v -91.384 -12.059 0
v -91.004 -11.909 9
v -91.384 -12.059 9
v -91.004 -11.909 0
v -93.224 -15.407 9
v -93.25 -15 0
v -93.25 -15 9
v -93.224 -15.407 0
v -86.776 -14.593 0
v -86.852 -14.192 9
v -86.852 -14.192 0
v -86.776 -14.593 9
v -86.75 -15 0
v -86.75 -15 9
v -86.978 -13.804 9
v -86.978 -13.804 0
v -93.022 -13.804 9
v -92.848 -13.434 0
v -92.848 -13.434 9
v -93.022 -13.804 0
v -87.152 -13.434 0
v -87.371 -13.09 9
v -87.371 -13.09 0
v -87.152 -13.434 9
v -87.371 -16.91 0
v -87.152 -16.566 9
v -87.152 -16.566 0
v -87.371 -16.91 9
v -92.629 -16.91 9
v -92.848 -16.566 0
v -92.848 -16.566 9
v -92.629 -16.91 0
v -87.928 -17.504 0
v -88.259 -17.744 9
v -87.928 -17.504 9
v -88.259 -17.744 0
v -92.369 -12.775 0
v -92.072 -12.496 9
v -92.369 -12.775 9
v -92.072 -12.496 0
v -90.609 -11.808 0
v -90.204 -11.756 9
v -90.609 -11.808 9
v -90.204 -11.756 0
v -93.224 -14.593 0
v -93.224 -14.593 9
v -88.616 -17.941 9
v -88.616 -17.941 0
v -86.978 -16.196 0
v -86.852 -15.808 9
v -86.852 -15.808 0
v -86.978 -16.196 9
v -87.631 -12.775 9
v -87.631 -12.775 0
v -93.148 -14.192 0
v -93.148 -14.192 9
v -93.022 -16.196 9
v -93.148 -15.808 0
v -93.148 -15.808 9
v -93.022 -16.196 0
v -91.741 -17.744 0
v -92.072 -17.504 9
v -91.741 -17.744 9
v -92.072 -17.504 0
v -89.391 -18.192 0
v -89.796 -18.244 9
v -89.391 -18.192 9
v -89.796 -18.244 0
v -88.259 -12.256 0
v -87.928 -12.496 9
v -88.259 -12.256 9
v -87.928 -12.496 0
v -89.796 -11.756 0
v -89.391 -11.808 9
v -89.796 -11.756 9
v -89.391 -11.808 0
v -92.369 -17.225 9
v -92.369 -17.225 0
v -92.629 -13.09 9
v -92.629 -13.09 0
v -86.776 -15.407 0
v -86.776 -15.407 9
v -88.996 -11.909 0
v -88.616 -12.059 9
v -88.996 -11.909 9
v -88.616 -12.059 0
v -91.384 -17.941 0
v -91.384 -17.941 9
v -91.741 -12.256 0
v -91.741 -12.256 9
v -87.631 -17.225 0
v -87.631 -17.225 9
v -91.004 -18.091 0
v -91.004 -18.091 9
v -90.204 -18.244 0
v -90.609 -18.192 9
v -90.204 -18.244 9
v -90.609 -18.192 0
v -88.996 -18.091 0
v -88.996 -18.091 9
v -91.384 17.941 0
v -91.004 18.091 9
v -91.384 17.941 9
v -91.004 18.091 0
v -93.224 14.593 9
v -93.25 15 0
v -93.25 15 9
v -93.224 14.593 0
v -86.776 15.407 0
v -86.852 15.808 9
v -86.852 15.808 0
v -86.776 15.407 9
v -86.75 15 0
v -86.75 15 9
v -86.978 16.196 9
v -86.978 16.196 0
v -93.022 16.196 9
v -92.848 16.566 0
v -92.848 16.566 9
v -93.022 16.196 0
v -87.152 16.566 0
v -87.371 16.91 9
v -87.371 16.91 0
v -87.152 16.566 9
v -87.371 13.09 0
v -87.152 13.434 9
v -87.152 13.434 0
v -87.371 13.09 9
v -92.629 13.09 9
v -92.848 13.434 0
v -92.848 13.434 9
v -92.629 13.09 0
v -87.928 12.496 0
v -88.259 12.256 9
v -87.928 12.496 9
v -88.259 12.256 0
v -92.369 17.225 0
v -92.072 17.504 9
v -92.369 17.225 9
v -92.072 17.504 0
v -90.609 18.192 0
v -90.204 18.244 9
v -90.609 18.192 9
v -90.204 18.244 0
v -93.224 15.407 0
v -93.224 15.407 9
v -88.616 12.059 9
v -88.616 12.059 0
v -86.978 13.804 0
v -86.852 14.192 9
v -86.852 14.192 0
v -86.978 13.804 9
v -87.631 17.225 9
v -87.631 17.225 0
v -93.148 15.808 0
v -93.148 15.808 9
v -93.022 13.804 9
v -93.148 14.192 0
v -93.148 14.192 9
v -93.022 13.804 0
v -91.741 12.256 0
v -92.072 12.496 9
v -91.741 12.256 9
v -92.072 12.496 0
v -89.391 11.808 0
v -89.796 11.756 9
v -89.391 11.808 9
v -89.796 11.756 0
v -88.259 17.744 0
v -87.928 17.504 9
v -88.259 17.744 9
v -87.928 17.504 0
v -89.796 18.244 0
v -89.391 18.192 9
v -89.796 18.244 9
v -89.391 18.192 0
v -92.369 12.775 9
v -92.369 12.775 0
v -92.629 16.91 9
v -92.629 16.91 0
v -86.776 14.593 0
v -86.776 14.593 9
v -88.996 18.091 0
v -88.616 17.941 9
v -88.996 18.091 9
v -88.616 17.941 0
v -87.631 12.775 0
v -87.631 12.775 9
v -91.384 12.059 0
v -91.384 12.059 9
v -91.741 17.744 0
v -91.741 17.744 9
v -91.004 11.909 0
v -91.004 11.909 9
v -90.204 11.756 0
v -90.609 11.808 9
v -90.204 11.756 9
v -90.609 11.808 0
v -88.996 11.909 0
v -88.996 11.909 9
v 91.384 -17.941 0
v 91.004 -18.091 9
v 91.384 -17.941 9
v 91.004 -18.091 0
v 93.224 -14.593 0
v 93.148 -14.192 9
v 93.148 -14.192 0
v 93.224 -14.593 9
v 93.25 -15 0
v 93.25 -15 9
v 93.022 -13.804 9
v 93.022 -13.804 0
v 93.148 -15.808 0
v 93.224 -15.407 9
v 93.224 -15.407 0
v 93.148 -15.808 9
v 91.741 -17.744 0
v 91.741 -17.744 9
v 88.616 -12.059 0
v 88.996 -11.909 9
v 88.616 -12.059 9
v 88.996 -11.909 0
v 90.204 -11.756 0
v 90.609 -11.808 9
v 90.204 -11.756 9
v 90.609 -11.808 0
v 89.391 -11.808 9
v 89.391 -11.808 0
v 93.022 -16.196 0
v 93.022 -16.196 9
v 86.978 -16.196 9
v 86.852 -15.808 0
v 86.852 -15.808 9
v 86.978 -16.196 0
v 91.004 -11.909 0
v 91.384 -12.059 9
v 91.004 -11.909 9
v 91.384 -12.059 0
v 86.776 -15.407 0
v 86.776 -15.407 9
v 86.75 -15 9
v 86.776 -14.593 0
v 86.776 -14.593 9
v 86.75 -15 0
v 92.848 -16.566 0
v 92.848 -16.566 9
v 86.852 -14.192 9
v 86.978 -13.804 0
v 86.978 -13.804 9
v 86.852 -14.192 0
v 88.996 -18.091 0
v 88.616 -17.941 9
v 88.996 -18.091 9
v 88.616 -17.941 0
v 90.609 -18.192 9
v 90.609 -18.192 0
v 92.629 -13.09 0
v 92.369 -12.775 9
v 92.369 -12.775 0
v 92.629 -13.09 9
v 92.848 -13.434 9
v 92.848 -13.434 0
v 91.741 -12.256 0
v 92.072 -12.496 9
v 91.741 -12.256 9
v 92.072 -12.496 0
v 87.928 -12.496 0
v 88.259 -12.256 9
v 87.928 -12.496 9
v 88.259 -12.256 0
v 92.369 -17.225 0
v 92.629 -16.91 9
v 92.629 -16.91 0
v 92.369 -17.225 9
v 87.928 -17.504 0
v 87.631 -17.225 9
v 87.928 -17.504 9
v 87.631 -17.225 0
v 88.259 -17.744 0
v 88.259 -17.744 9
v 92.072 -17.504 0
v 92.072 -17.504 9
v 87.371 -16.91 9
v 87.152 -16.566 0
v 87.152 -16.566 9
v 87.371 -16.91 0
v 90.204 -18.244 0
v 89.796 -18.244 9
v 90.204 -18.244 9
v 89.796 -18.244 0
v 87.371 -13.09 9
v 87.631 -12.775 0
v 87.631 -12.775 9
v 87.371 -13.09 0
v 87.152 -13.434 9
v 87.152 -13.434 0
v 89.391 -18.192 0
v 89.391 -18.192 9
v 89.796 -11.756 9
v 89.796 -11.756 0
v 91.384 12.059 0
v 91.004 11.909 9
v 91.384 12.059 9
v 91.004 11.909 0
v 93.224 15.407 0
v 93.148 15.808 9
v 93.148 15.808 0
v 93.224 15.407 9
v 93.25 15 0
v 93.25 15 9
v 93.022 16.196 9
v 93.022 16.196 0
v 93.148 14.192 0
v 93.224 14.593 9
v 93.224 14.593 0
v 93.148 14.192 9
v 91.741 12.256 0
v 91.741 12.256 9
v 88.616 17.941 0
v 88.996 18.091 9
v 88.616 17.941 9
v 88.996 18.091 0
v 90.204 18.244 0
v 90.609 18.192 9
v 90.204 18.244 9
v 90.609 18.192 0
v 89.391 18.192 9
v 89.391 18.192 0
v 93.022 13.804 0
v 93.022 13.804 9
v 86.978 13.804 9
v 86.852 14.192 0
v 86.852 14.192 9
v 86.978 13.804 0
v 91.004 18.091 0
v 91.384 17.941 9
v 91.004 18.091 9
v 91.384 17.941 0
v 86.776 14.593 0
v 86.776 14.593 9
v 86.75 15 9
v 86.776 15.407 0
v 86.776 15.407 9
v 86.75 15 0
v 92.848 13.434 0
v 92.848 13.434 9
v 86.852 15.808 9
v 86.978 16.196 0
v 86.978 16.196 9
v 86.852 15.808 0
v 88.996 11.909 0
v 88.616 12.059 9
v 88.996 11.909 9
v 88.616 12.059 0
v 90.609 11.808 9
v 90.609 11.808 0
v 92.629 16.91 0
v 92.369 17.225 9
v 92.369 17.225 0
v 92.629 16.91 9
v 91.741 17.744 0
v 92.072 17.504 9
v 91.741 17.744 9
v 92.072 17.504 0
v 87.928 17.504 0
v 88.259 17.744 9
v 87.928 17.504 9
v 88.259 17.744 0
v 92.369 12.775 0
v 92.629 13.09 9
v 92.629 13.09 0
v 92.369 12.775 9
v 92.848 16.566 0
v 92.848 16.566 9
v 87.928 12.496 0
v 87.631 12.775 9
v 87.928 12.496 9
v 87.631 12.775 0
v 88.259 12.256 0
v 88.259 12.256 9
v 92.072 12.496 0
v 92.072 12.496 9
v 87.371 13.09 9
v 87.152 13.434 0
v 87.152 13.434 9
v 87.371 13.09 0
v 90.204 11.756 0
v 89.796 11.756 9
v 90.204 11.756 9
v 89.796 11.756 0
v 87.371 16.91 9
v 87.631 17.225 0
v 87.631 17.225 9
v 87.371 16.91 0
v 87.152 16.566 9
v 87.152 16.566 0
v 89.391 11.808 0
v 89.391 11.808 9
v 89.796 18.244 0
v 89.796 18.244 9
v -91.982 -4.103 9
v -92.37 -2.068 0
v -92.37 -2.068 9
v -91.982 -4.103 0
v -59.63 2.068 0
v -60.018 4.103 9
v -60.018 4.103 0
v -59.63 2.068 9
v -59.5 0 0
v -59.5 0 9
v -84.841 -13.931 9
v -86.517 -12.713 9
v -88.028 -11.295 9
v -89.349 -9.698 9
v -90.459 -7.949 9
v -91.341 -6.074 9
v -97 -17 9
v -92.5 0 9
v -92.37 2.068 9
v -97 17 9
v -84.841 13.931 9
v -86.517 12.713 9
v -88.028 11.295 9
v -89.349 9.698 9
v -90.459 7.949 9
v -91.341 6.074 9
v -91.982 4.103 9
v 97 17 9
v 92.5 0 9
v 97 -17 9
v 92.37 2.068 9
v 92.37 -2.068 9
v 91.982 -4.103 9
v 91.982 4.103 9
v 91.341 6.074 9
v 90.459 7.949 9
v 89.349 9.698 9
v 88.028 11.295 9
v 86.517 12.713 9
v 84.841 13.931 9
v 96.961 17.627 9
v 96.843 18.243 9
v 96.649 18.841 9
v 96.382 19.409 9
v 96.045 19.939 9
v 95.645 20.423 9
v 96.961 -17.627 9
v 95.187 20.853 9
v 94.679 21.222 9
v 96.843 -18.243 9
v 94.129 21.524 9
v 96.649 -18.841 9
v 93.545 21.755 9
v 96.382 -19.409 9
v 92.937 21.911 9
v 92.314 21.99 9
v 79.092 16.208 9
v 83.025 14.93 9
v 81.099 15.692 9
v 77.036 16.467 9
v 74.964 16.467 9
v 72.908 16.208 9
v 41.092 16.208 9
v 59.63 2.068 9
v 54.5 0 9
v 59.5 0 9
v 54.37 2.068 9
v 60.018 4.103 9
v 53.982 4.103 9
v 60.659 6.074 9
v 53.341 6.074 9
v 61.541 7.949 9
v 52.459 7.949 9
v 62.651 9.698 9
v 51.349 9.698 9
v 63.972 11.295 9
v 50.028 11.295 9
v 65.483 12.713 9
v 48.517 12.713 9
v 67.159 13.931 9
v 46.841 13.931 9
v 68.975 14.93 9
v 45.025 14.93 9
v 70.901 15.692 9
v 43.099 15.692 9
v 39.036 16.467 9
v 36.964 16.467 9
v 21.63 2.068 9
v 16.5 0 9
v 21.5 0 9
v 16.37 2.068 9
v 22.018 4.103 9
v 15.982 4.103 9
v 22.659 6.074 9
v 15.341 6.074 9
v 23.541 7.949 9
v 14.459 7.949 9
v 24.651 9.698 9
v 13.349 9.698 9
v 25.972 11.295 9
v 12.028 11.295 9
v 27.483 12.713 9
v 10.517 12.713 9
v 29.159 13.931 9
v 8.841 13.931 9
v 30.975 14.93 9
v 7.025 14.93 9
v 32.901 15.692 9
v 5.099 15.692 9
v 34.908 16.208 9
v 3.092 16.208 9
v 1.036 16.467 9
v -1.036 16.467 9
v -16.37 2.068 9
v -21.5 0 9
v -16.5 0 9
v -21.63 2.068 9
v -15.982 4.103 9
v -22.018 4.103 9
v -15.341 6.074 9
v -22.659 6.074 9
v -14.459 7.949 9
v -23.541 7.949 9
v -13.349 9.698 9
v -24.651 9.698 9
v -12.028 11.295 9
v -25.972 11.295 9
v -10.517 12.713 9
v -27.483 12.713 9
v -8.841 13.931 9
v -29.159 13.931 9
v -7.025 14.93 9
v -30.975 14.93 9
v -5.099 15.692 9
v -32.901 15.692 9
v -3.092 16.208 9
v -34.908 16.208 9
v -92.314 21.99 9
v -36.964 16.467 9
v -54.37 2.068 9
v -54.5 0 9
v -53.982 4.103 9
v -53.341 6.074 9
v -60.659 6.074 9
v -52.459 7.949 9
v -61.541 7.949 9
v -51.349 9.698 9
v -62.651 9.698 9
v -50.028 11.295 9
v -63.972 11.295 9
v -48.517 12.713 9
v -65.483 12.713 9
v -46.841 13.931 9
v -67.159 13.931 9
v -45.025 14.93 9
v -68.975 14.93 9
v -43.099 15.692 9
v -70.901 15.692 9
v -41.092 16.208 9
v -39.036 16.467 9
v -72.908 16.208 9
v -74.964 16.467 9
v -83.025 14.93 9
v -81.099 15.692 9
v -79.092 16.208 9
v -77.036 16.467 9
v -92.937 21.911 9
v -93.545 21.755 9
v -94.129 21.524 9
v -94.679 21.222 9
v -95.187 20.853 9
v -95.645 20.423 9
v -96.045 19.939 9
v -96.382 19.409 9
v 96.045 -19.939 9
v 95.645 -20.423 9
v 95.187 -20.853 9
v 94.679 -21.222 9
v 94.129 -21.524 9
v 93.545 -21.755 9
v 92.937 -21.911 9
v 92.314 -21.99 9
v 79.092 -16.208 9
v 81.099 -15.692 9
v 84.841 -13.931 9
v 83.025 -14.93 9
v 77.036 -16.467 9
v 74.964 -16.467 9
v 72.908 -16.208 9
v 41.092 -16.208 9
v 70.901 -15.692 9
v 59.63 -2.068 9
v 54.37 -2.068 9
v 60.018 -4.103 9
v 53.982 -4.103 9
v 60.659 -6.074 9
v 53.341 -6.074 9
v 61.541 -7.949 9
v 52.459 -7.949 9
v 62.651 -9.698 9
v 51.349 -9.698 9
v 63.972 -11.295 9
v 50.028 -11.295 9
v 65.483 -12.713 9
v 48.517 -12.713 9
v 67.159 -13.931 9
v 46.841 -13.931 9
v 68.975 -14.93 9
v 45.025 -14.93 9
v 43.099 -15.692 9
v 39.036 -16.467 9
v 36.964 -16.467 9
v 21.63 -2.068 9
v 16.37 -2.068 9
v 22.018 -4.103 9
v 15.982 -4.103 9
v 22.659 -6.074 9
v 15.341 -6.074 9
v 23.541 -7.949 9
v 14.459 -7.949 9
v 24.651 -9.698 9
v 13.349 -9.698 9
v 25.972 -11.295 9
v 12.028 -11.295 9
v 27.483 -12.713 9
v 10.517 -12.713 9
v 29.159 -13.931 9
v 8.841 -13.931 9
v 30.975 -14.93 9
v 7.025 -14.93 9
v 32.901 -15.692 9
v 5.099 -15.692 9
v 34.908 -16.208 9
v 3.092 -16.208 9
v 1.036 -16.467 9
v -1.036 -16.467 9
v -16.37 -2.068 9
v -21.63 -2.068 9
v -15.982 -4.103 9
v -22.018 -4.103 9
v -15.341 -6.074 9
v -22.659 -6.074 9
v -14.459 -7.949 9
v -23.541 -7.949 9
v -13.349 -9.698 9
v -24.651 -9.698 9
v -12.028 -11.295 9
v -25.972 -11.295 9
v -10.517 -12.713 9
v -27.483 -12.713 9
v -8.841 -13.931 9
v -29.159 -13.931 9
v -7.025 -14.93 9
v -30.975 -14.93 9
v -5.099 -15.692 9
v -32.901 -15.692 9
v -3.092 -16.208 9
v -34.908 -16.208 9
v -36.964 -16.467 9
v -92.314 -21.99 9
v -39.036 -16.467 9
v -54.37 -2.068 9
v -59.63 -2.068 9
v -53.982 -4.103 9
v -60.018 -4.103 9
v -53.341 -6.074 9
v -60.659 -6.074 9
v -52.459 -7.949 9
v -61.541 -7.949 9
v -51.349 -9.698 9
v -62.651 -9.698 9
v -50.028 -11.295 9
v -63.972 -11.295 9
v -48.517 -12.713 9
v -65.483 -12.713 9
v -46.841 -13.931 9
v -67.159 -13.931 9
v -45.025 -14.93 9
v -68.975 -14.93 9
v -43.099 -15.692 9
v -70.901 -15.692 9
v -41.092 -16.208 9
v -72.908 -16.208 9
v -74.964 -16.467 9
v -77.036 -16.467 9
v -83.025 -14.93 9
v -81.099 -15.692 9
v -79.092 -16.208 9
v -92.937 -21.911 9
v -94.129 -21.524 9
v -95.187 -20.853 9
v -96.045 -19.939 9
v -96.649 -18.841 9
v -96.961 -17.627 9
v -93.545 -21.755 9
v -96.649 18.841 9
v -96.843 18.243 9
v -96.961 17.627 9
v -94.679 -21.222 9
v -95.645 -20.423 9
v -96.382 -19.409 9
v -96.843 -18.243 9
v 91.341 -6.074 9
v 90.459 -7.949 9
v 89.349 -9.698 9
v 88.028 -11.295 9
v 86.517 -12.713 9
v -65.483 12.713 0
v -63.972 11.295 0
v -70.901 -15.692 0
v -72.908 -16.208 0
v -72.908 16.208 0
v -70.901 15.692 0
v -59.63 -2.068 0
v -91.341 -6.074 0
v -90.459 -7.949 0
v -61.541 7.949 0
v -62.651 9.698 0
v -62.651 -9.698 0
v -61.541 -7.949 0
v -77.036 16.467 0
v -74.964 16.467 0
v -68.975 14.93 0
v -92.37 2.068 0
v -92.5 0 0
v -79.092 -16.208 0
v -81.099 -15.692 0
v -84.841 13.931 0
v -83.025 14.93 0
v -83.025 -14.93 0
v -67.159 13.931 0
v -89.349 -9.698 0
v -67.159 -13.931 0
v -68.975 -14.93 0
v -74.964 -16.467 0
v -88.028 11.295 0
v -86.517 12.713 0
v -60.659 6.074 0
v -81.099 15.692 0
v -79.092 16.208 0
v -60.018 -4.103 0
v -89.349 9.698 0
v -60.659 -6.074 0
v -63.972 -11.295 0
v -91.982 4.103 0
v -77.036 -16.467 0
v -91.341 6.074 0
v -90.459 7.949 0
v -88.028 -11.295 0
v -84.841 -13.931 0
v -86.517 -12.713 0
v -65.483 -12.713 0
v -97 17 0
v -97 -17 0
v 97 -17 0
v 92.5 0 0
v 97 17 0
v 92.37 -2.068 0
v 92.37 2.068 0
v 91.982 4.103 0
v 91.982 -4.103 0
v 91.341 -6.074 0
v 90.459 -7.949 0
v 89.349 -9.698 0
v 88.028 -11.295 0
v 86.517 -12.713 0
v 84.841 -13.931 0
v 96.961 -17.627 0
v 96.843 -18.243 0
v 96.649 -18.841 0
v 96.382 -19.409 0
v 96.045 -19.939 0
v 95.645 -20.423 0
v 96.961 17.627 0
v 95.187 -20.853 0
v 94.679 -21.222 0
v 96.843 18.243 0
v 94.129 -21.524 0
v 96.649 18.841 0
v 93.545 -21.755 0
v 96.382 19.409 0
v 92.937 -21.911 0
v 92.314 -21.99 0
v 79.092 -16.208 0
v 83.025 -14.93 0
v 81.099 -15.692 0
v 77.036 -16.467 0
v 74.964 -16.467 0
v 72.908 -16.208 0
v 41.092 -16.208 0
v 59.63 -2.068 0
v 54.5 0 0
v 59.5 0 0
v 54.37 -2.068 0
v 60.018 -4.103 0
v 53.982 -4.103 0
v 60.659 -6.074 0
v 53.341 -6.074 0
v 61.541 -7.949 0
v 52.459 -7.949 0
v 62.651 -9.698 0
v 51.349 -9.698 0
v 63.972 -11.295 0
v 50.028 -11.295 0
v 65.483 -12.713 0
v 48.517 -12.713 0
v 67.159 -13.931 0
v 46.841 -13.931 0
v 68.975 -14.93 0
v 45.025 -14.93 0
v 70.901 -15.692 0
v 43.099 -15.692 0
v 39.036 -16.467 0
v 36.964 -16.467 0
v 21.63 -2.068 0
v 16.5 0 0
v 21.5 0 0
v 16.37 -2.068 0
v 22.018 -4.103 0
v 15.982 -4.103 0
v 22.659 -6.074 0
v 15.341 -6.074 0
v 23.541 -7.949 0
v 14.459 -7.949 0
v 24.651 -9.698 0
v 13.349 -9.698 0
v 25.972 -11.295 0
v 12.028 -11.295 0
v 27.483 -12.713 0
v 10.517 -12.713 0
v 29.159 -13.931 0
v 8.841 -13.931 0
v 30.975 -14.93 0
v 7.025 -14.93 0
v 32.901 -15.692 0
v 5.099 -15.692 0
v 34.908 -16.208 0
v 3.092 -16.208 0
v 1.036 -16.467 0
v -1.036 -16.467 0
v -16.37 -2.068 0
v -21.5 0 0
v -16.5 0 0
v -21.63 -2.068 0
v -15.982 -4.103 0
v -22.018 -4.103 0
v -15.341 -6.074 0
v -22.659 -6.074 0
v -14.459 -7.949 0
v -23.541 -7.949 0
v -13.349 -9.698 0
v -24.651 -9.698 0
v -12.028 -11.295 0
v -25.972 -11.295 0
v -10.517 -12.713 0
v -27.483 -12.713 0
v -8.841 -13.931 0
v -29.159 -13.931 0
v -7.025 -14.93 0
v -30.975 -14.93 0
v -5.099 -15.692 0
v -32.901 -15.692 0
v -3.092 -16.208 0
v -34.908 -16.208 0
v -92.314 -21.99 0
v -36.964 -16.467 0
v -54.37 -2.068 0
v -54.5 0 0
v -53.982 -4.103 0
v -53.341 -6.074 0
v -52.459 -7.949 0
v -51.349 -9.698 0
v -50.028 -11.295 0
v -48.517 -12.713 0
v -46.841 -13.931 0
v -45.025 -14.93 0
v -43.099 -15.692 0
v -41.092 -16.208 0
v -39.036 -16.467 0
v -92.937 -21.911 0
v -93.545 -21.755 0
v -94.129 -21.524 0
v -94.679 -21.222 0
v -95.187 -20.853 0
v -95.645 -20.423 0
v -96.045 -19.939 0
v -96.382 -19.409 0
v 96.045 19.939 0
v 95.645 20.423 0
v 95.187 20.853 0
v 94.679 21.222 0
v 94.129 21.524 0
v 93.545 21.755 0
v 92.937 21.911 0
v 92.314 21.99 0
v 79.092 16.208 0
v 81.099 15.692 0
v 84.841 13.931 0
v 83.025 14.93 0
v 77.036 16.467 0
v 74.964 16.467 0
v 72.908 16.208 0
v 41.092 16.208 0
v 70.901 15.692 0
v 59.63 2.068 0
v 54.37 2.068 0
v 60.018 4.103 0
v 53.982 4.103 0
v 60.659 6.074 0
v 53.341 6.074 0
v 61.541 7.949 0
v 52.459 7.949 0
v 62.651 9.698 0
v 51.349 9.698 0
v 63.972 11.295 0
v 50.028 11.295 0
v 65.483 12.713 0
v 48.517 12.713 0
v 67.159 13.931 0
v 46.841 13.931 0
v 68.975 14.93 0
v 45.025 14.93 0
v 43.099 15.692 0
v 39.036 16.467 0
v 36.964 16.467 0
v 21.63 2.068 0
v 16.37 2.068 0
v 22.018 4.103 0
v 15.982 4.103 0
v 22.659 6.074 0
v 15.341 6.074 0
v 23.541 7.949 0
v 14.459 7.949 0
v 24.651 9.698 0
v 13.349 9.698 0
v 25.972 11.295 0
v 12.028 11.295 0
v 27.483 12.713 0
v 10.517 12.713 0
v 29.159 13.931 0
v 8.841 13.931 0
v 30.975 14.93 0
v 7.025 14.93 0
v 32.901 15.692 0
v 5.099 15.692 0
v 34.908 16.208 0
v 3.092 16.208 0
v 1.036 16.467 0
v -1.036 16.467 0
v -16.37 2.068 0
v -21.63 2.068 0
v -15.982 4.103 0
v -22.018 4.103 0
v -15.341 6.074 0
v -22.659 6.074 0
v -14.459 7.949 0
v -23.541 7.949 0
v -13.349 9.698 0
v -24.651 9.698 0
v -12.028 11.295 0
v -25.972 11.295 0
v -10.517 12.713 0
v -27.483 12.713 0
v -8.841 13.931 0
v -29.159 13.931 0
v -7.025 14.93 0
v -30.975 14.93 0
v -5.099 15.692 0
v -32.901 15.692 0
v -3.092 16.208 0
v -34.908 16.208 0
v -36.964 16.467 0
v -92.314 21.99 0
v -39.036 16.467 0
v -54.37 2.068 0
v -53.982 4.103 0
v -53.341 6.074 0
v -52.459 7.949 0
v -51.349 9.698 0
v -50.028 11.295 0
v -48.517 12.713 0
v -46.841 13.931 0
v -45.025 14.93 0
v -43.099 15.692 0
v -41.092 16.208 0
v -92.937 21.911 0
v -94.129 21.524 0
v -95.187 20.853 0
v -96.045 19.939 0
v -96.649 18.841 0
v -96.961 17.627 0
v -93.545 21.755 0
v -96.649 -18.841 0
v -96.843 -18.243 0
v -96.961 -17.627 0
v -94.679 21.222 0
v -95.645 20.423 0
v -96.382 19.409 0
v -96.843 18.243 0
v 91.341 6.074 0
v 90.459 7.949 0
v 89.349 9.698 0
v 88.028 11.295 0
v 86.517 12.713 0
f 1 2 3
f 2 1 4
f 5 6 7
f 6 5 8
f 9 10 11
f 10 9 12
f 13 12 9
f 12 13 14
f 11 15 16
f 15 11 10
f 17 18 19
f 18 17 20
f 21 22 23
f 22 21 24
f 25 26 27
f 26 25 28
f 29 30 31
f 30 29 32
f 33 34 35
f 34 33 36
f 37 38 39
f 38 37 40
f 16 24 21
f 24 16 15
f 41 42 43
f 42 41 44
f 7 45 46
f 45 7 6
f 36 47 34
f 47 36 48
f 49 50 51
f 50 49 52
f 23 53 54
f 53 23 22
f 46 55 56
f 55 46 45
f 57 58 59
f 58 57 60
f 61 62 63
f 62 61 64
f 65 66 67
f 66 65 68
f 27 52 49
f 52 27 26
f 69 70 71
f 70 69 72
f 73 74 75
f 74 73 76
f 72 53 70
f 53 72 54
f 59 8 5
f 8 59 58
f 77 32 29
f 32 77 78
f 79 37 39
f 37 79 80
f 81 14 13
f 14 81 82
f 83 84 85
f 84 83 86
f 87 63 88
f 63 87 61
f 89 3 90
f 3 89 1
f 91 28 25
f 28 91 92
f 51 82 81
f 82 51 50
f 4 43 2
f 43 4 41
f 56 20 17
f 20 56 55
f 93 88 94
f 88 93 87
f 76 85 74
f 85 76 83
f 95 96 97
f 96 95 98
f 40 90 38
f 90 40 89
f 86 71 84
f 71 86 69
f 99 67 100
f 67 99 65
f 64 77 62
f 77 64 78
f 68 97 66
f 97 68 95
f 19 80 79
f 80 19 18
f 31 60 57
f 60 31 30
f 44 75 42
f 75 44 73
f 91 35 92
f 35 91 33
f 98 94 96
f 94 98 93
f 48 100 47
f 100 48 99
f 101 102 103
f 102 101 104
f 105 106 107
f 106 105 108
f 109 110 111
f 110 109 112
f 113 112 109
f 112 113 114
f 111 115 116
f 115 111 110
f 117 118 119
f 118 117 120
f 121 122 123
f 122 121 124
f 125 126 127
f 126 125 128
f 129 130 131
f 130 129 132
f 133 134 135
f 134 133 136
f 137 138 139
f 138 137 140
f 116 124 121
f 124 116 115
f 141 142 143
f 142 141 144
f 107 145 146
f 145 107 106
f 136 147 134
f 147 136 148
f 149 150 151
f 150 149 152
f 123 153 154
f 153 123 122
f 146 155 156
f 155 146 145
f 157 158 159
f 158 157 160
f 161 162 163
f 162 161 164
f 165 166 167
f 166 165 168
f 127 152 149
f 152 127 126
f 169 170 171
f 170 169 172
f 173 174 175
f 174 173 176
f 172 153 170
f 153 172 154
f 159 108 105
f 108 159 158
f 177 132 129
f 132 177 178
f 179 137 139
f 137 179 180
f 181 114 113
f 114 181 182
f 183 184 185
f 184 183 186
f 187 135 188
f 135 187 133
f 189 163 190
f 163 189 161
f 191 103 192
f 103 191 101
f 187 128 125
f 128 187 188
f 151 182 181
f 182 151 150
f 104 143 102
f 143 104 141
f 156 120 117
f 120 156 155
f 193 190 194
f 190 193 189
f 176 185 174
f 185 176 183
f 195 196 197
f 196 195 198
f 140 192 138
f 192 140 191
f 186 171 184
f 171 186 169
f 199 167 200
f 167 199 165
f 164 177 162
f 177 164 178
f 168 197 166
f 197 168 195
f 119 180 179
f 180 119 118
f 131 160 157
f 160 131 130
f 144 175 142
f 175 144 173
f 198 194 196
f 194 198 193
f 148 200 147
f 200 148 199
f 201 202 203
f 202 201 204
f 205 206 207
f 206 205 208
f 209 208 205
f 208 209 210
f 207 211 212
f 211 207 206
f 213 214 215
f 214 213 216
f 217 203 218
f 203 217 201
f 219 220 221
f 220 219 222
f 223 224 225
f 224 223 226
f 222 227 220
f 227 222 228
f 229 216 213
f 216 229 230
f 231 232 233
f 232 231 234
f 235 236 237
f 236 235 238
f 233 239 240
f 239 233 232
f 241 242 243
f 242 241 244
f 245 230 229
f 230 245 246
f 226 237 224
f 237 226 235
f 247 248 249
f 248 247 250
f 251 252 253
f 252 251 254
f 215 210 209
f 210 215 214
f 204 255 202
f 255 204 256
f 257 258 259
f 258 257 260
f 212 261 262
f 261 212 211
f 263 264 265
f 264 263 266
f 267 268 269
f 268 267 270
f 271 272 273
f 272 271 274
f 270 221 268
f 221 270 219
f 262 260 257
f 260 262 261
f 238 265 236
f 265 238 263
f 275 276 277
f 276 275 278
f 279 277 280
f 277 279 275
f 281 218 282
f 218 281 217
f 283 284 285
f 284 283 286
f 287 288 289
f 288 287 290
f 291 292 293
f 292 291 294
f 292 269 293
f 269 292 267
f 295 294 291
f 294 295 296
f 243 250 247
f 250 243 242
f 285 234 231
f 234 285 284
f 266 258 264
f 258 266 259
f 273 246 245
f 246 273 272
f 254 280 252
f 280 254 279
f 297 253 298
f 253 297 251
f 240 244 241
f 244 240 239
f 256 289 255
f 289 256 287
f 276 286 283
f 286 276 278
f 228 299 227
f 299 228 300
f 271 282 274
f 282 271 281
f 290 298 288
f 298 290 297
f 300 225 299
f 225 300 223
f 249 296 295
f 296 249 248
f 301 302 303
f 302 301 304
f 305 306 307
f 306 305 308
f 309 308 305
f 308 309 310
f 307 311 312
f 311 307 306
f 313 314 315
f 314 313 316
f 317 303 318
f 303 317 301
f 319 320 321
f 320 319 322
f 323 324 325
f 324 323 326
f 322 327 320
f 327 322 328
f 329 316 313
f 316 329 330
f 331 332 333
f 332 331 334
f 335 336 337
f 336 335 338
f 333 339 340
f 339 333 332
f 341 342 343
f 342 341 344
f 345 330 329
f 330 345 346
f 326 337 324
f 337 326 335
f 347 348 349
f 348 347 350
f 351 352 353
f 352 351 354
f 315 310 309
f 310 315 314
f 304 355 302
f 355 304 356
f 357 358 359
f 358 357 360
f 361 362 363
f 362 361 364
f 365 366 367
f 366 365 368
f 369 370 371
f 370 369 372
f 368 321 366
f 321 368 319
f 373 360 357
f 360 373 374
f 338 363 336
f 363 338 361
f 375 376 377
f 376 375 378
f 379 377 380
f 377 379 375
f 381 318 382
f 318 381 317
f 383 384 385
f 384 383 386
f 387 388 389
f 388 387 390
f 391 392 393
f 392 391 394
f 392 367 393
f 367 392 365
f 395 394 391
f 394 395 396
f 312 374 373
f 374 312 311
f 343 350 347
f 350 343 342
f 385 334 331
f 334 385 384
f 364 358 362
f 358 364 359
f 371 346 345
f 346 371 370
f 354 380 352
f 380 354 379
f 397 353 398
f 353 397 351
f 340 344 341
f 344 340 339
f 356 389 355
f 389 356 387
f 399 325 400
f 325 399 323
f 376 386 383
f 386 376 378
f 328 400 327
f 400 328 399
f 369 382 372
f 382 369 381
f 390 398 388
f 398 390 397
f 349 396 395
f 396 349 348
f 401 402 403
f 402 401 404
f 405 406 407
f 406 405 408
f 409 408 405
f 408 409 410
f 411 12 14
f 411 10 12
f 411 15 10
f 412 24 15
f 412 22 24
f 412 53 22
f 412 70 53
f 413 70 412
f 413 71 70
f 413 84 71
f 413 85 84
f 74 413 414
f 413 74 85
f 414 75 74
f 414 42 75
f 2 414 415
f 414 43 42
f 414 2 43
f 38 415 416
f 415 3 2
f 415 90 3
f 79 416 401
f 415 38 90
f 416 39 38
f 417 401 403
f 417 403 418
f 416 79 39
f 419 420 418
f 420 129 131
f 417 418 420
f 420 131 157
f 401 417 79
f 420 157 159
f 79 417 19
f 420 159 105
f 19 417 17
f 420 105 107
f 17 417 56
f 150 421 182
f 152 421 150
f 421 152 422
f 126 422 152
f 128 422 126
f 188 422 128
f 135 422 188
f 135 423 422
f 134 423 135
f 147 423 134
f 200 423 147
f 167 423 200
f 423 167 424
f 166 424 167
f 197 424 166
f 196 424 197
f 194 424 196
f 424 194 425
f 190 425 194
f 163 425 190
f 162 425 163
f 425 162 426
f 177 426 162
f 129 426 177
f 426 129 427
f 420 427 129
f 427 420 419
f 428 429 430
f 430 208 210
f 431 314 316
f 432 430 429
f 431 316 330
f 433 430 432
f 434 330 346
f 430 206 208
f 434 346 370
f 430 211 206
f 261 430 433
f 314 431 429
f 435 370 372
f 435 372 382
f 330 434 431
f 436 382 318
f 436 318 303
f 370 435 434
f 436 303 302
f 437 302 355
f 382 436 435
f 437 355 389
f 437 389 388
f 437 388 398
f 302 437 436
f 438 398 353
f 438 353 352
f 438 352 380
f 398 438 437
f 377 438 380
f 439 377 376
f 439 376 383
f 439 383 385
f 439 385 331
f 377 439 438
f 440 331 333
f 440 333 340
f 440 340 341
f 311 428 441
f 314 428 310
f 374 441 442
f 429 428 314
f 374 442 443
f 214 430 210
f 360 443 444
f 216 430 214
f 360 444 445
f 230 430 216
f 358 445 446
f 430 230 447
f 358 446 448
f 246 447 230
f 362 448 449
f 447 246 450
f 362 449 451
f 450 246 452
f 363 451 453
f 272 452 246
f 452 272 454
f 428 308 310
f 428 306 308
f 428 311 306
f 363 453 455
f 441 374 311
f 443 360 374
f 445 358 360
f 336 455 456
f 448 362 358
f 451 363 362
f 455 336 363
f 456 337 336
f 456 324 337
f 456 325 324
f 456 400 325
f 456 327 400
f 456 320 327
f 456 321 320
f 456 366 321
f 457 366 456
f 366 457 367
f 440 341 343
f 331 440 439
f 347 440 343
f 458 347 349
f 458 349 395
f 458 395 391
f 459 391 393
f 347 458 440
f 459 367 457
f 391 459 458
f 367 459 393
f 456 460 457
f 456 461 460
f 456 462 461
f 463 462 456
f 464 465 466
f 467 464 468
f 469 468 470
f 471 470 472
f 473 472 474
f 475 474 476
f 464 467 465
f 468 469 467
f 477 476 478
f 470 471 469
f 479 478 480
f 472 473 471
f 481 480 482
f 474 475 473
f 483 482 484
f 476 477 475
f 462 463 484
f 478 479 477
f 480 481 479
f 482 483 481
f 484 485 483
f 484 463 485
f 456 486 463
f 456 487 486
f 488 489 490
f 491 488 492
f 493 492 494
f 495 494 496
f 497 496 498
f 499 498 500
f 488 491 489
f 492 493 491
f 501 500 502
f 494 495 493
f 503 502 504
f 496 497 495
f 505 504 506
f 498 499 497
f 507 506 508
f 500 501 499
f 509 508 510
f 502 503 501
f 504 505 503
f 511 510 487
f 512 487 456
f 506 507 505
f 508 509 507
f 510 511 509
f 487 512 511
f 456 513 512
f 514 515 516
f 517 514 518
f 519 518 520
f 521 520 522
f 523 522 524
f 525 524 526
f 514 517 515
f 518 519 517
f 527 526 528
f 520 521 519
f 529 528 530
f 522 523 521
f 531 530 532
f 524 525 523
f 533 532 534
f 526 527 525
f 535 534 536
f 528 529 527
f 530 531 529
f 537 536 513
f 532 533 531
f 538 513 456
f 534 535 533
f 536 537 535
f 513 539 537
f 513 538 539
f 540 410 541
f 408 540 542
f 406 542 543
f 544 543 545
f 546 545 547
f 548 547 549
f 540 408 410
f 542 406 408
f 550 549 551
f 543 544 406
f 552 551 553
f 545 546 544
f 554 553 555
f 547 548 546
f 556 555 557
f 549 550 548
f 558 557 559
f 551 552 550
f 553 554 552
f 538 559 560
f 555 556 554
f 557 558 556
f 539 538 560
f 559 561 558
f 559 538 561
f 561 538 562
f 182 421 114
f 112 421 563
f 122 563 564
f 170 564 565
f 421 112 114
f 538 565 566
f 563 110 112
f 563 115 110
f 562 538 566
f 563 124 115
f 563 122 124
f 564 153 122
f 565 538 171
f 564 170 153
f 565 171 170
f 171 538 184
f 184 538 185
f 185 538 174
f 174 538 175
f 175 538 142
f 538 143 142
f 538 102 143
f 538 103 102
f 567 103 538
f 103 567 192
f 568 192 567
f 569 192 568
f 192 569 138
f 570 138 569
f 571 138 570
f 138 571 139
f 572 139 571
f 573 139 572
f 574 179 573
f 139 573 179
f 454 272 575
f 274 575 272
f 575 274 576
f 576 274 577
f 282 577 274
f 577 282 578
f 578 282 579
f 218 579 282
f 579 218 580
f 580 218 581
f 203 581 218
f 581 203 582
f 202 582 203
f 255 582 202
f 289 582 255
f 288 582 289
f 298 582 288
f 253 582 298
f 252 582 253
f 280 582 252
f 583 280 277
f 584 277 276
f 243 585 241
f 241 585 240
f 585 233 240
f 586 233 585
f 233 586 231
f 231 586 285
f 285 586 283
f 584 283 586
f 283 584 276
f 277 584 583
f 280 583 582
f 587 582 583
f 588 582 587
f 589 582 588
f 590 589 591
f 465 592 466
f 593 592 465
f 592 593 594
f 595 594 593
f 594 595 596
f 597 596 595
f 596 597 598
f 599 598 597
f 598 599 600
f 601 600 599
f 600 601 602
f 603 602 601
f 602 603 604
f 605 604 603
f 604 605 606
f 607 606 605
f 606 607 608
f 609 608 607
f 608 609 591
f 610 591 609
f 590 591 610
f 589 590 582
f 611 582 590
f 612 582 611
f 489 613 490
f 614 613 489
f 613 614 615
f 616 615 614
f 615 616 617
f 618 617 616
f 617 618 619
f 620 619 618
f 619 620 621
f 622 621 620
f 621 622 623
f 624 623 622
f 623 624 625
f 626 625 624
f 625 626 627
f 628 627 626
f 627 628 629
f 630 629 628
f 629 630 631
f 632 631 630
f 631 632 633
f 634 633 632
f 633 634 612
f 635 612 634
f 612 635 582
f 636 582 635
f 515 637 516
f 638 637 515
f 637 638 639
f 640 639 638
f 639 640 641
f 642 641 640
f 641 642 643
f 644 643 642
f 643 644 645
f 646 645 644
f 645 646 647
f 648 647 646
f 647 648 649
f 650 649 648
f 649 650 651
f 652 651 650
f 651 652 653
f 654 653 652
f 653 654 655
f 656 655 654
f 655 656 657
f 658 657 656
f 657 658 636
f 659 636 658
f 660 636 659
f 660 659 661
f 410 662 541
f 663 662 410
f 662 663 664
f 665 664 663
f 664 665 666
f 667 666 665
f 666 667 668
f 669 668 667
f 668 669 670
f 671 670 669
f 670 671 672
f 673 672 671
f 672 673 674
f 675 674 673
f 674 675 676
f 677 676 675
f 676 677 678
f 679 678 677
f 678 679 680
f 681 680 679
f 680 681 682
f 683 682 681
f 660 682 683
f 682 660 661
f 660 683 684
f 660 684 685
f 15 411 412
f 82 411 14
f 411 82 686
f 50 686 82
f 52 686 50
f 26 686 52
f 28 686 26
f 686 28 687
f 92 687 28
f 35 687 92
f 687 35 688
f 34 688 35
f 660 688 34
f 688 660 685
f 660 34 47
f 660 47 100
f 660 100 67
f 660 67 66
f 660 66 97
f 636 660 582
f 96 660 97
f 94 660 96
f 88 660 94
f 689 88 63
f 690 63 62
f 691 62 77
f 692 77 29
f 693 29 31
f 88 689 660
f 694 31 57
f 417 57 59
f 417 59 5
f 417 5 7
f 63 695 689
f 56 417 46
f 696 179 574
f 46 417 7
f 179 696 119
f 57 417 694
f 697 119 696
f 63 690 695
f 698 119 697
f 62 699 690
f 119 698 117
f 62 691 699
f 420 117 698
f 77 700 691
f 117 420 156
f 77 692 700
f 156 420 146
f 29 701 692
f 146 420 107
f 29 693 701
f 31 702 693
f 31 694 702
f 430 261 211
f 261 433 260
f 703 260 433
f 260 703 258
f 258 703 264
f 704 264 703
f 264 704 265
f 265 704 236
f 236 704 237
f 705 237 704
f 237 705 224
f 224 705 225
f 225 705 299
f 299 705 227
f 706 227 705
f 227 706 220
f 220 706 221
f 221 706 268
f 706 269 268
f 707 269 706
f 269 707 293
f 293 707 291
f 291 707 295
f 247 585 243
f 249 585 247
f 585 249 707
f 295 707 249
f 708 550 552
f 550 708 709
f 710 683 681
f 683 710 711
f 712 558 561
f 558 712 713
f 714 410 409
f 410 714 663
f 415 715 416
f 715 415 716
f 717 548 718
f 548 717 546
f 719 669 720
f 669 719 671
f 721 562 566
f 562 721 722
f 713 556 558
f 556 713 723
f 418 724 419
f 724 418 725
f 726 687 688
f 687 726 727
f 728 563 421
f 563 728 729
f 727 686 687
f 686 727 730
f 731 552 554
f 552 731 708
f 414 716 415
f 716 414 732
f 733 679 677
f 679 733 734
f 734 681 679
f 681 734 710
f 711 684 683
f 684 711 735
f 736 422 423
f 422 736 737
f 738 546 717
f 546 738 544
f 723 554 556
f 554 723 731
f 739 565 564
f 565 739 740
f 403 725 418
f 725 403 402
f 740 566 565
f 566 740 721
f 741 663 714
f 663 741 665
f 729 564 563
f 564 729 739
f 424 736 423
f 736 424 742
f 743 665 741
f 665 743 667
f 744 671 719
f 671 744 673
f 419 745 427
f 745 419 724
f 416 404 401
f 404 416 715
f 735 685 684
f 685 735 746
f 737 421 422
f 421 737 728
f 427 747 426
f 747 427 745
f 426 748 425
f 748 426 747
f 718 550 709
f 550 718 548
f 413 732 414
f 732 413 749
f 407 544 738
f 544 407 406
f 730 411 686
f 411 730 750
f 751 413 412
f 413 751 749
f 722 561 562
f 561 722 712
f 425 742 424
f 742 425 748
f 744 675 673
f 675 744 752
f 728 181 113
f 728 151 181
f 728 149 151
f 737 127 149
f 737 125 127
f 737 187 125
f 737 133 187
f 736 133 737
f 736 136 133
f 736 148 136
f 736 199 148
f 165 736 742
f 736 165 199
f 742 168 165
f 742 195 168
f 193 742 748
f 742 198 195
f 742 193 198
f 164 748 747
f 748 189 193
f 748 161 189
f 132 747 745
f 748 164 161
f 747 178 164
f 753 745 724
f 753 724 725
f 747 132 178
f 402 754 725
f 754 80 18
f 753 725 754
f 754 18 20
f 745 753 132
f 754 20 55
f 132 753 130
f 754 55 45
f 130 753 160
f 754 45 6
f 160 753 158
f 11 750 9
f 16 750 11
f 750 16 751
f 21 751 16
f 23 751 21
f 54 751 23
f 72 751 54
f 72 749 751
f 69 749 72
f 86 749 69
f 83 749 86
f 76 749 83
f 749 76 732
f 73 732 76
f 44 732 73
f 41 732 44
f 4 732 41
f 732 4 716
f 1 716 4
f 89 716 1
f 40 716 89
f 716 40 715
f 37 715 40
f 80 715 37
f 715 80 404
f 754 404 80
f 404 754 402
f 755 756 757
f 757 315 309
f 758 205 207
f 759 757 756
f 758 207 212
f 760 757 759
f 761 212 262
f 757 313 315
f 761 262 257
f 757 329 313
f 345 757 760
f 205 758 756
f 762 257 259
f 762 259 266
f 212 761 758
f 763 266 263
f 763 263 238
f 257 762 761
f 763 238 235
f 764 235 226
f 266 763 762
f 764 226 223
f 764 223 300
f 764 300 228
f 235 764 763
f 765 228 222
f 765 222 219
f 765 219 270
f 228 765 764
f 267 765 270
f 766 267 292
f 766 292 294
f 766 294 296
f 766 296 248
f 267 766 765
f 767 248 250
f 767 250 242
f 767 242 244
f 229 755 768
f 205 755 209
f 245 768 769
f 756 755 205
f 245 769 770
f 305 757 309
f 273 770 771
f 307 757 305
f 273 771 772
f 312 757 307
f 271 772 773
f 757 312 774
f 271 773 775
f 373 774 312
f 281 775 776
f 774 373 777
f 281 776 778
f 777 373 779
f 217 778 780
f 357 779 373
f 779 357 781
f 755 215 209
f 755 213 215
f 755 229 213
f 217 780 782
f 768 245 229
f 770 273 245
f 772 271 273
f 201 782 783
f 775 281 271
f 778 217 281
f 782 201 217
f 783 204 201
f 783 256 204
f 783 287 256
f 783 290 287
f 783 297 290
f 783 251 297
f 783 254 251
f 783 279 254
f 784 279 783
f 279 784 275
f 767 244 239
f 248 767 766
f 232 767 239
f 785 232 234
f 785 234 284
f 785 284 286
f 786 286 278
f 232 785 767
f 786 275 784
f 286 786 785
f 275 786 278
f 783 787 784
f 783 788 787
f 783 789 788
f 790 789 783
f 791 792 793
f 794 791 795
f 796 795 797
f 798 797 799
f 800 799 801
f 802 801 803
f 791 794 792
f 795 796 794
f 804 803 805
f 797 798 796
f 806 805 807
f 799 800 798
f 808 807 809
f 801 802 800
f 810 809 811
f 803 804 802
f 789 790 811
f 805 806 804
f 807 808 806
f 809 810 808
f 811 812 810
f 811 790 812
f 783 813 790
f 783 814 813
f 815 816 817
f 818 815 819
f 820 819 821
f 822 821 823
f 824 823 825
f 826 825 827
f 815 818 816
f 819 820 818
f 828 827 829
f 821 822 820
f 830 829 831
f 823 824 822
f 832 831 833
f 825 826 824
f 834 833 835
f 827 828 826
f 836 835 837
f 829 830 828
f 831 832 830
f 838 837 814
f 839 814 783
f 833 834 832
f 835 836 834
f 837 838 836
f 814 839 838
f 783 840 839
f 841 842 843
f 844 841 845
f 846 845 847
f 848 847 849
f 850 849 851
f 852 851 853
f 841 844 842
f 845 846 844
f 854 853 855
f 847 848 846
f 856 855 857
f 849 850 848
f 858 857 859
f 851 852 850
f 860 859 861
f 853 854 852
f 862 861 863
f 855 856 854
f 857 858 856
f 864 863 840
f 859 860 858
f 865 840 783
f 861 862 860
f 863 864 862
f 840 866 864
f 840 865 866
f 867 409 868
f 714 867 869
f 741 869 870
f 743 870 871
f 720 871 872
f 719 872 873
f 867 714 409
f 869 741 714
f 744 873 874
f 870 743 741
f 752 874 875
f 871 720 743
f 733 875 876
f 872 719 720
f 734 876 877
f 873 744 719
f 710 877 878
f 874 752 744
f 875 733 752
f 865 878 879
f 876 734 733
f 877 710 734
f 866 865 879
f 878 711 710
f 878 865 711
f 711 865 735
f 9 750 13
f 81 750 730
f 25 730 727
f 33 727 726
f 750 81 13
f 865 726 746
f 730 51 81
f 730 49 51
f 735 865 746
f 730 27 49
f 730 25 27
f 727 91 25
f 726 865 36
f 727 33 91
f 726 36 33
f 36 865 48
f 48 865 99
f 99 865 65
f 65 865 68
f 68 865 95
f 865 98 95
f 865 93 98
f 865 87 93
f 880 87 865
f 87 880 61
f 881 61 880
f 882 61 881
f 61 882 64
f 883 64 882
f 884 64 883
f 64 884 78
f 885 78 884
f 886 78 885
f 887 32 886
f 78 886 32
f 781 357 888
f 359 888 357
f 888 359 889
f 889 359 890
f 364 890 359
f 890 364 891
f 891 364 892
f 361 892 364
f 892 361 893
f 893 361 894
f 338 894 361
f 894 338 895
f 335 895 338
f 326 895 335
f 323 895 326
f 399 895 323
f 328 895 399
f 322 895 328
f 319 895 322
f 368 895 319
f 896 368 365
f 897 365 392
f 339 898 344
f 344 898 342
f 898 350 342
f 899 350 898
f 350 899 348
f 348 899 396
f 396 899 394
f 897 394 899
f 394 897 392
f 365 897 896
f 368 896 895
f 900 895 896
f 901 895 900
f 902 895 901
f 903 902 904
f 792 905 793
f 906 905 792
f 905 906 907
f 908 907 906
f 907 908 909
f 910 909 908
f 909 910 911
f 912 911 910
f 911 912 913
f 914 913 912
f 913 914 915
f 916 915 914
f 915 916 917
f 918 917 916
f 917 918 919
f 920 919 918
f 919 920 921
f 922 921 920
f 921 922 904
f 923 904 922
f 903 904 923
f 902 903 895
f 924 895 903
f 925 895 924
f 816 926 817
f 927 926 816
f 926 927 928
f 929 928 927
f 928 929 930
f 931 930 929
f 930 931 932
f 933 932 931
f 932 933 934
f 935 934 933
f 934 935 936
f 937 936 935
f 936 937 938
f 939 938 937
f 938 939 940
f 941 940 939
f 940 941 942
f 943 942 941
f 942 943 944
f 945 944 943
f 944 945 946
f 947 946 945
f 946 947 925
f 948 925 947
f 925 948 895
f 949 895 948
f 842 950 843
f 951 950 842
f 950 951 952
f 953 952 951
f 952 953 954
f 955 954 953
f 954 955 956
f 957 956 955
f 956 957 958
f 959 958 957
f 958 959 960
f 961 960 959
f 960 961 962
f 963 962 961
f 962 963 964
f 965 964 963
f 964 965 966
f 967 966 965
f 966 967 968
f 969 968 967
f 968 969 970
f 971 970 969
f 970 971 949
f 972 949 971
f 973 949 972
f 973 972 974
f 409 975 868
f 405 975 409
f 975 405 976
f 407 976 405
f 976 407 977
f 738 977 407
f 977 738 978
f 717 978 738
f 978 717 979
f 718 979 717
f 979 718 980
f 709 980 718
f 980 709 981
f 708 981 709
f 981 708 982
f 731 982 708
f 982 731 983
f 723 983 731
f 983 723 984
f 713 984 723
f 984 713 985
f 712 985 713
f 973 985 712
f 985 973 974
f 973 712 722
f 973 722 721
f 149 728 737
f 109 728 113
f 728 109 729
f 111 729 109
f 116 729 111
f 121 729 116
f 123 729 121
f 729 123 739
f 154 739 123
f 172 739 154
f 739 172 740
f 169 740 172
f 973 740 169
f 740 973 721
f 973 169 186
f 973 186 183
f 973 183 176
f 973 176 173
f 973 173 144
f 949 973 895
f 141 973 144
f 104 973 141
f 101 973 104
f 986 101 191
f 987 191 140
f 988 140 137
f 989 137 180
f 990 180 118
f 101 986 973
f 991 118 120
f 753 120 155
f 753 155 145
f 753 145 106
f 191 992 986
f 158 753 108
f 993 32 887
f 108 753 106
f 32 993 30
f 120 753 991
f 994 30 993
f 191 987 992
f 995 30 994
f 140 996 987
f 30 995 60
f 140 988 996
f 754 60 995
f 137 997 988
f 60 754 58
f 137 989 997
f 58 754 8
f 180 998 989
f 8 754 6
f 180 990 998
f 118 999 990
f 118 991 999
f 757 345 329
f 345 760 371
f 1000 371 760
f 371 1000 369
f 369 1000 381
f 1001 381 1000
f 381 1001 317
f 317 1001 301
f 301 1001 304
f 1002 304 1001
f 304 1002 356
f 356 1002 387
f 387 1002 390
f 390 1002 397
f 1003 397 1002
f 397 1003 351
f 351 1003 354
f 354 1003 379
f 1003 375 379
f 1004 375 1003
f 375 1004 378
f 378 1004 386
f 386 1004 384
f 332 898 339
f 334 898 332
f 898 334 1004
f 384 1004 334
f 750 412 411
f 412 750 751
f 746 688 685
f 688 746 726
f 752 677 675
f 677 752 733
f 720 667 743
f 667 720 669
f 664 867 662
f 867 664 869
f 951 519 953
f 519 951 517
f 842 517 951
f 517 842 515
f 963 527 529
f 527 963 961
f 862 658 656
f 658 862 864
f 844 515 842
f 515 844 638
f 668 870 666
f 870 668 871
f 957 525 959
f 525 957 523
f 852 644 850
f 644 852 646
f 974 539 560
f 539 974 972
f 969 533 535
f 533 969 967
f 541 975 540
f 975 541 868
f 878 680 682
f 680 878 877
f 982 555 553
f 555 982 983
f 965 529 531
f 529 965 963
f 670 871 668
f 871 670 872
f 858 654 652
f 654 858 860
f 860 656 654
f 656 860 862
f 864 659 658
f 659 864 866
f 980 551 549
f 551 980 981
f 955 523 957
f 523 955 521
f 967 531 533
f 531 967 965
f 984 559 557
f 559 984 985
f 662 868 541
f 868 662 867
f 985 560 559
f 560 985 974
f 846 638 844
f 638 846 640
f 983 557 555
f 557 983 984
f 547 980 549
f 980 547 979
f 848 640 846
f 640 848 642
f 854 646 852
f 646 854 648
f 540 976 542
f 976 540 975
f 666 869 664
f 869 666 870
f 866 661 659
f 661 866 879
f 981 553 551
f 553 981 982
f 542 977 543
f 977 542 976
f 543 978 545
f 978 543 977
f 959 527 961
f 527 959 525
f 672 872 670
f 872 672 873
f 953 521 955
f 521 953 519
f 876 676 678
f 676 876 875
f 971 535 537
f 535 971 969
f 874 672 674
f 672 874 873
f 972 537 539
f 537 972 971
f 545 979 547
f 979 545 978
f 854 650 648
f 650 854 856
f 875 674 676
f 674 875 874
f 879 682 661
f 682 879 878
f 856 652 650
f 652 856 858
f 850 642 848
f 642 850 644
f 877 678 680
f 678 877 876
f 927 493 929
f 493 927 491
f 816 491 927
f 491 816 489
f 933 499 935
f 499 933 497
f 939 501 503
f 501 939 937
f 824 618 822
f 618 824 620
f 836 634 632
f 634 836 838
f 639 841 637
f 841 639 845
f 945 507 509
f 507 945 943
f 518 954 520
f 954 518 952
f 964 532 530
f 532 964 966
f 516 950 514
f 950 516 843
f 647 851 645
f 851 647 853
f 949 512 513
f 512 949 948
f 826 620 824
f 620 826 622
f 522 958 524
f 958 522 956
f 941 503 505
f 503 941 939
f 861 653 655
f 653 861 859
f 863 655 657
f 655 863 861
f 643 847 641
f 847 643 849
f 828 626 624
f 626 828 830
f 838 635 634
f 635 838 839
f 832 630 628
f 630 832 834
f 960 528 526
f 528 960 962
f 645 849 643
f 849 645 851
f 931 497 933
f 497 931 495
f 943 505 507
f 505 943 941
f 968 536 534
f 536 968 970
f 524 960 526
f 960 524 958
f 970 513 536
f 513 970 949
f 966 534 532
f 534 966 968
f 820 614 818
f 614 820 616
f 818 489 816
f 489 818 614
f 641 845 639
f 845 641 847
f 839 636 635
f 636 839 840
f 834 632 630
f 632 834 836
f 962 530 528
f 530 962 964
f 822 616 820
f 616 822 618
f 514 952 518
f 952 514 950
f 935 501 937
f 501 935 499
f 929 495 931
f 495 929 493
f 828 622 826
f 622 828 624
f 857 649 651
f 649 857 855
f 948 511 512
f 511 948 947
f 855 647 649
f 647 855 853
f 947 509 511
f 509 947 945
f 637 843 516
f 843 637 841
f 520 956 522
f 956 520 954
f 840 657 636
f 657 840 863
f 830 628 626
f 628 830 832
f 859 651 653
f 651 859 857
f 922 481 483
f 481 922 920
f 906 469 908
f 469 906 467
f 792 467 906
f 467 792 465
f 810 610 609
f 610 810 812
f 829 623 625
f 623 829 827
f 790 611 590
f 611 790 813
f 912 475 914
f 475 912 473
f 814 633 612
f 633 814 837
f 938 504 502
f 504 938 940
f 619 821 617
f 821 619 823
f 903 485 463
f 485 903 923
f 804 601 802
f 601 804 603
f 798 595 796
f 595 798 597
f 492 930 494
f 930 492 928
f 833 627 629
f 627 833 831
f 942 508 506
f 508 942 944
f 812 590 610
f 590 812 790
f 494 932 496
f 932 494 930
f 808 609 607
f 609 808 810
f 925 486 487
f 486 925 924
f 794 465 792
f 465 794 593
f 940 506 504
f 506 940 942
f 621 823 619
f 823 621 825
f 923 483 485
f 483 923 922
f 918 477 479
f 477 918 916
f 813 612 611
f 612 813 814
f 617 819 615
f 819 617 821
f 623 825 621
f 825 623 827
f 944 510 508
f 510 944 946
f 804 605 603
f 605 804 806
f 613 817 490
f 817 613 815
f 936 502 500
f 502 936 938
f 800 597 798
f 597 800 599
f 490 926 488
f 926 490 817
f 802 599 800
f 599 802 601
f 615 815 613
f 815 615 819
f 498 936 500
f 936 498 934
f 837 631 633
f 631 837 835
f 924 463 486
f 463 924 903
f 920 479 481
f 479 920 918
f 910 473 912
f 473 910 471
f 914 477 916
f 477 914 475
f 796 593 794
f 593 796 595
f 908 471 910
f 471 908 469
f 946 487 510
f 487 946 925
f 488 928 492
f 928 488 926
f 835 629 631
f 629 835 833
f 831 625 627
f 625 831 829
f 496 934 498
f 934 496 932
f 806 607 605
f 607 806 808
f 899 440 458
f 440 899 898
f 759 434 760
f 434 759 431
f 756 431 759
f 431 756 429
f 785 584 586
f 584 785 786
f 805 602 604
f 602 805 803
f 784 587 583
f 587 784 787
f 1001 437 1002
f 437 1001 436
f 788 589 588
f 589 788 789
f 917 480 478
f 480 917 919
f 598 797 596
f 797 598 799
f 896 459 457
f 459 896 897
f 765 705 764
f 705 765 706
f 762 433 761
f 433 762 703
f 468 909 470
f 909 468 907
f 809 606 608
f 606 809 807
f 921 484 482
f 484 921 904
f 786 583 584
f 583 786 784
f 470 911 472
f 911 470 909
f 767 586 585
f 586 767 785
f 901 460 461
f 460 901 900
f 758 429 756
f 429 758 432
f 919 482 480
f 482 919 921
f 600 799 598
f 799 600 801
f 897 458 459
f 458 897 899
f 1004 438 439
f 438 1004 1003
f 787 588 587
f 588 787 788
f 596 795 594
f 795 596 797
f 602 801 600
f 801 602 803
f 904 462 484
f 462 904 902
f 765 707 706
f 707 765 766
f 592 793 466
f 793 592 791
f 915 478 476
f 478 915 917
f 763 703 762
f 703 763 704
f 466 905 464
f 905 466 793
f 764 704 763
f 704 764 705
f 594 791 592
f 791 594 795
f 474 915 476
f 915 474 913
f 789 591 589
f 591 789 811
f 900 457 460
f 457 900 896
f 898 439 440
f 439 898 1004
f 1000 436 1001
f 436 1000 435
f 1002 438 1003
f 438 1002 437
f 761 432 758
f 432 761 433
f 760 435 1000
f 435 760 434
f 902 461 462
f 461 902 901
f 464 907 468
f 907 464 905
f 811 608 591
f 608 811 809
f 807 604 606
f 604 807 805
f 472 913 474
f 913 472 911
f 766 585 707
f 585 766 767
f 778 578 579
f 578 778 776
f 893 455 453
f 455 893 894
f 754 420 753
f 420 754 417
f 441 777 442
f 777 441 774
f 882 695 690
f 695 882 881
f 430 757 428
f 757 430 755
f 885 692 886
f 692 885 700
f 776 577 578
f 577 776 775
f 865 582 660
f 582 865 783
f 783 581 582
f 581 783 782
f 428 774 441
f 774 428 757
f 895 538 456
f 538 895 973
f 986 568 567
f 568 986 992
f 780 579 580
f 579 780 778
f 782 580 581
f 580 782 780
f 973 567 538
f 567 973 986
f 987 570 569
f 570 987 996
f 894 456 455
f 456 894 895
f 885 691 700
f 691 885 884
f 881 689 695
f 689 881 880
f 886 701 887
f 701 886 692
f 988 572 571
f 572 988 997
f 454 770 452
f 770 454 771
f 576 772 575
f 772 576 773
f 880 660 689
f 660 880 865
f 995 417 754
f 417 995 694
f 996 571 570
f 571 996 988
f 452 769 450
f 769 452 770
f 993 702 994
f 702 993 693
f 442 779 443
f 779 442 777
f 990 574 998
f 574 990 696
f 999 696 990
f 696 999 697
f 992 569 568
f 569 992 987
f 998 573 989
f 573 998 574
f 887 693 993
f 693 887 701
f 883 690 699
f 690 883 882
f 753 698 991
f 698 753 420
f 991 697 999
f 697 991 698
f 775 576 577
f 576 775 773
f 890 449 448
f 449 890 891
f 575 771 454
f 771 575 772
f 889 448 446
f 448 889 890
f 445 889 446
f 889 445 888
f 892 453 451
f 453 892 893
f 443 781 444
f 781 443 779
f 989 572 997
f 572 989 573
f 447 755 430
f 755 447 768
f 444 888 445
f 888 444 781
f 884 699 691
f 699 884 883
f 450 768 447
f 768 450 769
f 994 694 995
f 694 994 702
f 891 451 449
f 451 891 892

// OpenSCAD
$fn = 50;


difference() {
	union() {
		hull() {
			translate(v = [-92.0000000000, 17.0000000000, 0]) {
				cylinder(h = 9, r = 5);
			}
			translate(v = [92.0000000000, 17.0000000000, 0]) {
				cylinder(h = 9, r = 5);
			}
			translate(v = [-92.0000000000, -17.0000000000, 0]) {
				cylinder(h = 9, r = 5);
			}
			translate(v = [92.0000000000, -17.0000000000, 0]) {
				cylinder(h = 9, r = 5);
			}
		}
	}
	union() {
		#translate(v = [-90.0000000000, -15.0000000000, -100.0000000000]) {
			cylinder(h = 200, r = 3.2500000000);
		}
		#translate(v = [-90.0000000000, 15.0000000000, -100.0000000000]) {
			cylinder(h = 200, r = 3.2500000000);
		}
		#translate(v = [90.0000000000, -15.0000000000, -100.0000000000]) {
			cylinder(h = 200, r = 3.2500000000);
		}
		#translate(v = [90.0000000000, 15.0000000000, -100.0000000000]) {
			cylinder(h = 200, r = 3.2500000000);
		}
		#translate(v = [-76.0000000000, 0, 0]) {
			cylinder(h = 9, r = 16.5000000000);
		}
		#translate(v = [-38.0000000000, 0, 0]) {
			cylinder(h = 9, r = 16.5000000000);
		}
		#cylinder(h = 9, r = 16.5000000000);
		#translate(v = [38.0000000000, 0, 0]) {
			cylinder(h = 9, r = 16.5000000000);
		}
		#translate(v = [76.0000000000, 0, 0]) {
			cylinder(h = 9, r = 16.5000000000);
		}
	}
}
